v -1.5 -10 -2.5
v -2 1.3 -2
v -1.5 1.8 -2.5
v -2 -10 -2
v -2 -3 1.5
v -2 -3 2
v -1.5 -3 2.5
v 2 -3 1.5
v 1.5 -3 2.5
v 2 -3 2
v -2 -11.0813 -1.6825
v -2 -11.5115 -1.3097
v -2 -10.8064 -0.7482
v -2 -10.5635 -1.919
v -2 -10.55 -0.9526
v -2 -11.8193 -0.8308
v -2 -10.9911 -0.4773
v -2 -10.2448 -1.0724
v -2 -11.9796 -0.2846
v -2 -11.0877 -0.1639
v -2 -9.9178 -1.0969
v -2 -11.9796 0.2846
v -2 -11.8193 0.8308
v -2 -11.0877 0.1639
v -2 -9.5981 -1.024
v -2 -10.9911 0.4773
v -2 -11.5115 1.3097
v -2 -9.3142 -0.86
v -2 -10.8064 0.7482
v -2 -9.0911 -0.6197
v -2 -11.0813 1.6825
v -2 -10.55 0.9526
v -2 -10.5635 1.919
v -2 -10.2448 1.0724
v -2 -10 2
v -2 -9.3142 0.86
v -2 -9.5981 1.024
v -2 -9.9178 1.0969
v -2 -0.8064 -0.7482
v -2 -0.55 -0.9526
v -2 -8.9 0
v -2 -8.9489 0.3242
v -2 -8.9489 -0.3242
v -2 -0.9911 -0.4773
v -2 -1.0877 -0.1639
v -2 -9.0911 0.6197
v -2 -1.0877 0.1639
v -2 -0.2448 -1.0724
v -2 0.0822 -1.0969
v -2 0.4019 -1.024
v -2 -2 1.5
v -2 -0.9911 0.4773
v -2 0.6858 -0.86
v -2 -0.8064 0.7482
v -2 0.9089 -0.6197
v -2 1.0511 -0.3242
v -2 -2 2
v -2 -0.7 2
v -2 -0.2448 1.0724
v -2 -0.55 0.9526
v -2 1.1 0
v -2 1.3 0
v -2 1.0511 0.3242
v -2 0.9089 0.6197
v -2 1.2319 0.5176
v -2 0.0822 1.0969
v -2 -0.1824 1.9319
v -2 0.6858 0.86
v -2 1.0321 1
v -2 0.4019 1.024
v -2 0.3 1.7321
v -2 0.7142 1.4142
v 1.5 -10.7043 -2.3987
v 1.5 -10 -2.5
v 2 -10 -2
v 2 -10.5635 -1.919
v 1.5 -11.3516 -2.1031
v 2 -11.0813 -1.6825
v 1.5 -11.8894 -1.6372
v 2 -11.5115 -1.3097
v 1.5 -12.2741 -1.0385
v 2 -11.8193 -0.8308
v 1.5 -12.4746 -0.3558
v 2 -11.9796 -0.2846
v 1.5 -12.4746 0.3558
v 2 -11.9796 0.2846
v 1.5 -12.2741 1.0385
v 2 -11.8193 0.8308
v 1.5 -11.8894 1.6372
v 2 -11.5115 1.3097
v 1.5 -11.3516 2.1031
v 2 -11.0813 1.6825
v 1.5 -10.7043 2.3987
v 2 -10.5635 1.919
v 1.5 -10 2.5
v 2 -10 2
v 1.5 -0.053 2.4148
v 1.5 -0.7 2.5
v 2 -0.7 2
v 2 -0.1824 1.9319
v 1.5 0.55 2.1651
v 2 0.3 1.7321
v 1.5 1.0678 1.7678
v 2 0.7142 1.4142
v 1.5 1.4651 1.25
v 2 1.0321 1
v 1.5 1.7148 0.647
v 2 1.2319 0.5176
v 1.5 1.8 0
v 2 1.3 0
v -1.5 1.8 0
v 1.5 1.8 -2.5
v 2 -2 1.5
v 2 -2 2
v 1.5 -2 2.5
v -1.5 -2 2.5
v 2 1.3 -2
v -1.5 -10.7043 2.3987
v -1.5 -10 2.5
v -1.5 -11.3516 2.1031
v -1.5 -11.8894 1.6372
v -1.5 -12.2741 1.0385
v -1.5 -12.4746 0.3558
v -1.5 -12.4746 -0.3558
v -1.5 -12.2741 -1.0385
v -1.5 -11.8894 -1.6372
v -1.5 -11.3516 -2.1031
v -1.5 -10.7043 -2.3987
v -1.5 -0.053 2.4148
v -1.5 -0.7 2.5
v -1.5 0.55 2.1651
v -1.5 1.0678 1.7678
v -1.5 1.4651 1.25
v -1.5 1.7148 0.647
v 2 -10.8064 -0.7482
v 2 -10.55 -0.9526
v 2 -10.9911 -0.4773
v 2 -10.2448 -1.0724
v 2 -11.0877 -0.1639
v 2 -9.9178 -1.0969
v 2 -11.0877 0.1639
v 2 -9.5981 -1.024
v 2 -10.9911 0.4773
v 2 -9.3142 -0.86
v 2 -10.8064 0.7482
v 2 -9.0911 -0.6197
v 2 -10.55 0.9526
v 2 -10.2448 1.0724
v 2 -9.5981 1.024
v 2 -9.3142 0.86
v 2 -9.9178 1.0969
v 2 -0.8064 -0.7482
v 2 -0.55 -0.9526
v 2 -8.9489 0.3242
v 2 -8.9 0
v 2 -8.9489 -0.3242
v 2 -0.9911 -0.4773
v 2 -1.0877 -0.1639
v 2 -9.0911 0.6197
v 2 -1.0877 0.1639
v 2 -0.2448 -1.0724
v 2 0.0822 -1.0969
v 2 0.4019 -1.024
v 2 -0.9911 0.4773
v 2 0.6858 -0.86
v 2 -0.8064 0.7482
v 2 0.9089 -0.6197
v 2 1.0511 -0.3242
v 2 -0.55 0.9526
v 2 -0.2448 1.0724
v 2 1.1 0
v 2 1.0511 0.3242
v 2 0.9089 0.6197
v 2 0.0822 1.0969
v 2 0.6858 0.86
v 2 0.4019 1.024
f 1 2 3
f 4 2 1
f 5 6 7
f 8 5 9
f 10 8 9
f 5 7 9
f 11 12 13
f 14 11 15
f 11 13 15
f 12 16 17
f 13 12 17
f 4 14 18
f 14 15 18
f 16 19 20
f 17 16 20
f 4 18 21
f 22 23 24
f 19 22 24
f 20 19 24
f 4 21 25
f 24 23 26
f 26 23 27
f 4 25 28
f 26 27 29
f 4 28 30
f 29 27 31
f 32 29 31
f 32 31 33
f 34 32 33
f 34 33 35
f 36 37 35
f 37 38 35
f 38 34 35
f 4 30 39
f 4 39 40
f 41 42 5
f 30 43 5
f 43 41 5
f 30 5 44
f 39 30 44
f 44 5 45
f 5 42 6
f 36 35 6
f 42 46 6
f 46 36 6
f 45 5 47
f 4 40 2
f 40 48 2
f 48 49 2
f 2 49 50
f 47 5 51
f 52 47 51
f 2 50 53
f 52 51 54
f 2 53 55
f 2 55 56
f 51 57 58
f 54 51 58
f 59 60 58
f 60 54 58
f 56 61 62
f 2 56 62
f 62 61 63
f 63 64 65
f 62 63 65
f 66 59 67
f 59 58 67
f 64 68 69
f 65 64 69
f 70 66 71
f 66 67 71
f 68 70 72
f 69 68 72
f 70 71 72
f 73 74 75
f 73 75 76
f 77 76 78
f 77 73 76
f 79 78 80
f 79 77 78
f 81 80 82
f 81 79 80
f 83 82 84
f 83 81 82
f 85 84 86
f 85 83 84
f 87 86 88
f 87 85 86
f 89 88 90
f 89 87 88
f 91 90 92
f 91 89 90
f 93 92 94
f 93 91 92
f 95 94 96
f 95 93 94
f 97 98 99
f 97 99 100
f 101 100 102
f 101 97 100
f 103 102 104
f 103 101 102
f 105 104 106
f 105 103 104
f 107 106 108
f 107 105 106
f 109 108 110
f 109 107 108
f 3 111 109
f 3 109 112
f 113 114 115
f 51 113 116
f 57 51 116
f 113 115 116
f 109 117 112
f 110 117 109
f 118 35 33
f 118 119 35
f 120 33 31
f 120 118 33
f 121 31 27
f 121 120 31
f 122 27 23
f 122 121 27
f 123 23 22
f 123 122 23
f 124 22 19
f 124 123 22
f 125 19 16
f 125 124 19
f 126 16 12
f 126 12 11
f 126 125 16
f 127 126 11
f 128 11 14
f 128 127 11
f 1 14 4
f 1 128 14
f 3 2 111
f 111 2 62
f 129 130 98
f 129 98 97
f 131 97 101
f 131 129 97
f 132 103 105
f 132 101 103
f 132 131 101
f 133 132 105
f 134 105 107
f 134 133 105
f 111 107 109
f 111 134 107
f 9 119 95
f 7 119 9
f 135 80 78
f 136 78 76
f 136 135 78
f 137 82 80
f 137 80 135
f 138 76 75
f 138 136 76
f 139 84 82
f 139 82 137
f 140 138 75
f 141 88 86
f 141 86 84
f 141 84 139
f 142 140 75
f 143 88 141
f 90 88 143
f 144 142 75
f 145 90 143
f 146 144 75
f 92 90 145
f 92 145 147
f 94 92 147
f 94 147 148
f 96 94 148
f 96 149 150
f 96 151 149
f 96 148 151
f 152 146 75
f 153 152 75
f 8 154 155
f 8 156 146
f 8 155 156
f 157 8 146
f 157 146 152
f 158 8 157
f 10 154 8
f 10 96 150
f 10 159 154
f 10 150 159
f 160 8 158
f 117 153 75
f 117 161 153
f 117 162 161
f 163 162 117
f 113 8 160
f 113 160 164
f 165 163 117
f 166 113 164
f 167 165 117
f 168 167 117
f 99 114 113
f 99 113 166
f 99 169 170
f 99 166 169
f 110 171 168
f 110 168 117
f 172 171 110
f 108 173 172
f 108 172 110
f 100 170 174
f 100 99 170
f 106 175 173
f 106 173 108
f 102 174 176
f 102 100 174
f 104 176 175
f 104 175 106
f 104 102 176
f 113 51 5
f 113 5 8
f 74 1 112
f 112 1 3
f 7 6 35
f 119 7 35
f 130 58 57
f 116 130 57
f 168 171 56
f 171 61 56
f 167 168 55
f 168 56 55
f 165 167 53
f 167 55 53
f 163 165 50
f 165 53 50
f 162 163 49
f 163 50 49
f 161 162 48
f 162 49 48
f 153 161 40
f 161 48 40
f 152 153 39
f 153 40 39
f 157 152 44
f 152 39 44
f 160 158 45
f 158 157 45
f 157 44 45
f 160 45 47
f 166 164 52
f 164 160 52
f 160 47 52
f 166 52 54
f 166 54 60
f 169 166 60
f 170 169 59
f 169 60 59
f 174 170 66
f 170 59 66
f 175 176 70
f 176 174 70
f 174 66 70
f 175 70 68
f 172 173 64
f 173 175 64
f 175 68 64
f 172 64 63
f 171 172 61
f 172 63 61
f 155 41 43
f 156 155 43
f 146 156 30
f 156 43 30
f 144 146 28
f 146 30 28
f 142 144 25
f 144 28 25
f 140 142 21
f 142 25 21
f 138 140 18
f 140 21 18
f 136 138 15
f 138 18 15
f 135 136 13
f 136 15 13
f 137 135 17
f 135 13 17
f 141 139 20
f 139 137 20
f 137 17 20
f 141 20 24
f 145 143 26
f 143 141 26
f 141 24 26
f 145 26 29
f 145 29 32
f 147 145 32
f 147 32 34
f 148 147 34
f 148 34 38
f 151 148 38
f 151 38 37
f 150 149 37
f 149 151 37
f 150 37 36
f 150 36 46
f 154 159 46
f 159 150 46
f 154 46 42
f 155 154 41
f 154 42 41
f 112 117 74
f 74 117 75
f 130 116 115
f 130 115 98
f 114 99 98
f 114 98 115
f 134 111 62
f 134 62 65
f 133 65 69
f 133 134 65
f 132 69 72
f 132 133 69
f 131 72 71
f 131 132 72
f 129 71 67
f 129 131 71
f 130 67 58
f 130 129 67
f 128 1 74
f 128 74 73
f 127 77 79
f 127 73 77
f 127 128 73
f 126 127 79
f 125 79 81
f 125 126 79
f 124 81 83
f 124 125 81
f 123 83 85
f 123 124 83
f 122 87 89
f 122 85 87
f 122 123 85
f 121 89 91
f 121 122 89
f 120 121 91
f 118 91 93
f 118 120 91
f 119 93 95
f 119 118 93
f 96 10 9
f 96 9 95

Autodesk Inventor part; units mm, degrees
ref_plane "YZ Plane" through (0, 0, 0) normal (1, 0, 0) x (0, 1, 0)
ref_plane "XZ Plane" through (0, 0, 0) normal (0, 1, 0) x (-1, 0, 0)
ref_plane "XY Plane" through (0, 0, 0) normal (0, 0, 1) x (1, 0, 0)
sketch "Skizze1" plane through (0, 0, 0) normal (1, 0, 0) x (0, 1, 0)
  line L0 (0, 0) -> (-10, 0) construction
  circle A0 centre (0, 0) radius 1.1
  circle A1 centre (-10, 0) radius 1.1
  arc A2 (-10, 2.5) -> (-10, -2.5) centre (-10, 0) ccw
  line L1 (-10, -2.5) -> (1.8, -2.5)
  line L2 (-10, 2.5) -> (-0.7, 2.5)
  arc A3 (1.8, 0) -> (-0.7, 2.5) centre (-0.7, 0) ccw
  line L3 (1.8, 0) -> (1.8, -2.5)
  dimension "d0" = 10
  dimension "d1" = 2.2
  dimension "d2" = 2.2
  dimension "d3" = 2.5
  dimension "d8" = 2.5
  dimension "d9" = 1.8
extrude "Extrusion1" add sketch "Skizze1" along normal mid plane 4
chamfer "Fase1" distance 0.5 angle 45 10 edges at (2, 1.0678, 1.7678) (2, -5.35, 2.5) (2, -12.5, 0) (2, -4.1, -2.5) (2, 1.8, -1.25) (-2, 1.0678, 1.7678) (-2, -5.35, 2.5) (-2, -12.5, 0) (-2, -4.1, -2.5) (-2, 1.8, -1.25)
sketch "Skizze5" plane through (-1.5, -10, 2.5) normal (0, 0, 1) x (1, 0, 0)
  line L0 (1.5, 14.66) -> (1.5, -5.36) projected
  line L1 (-1.3, 10) -> (4.3, 10) projected
  line L2 (3.5, 8) -> (-0.5, 8)
  line L3 (-0.5, 8) -> (-0.5, 7)
  line L4 (-0.5, 7) -> (3.5, 7)
  line L5 (3.5, 7) -> (3.5, 8)
  line L6 (3.5, 0) -> (3.5, 9.3) projected
  line L7 (-0.5, 9.3) -> (-0.5, 0) projected
  point P0 (1.5, 10)
  dimension "d26" = 1
  dimension "d27" = 2
extrude "Extrusion4" cut sketch "Skizze5" against normal blind 1
equation "\"d2\" = d1"
properties part number "Chipanschlag TN1"
